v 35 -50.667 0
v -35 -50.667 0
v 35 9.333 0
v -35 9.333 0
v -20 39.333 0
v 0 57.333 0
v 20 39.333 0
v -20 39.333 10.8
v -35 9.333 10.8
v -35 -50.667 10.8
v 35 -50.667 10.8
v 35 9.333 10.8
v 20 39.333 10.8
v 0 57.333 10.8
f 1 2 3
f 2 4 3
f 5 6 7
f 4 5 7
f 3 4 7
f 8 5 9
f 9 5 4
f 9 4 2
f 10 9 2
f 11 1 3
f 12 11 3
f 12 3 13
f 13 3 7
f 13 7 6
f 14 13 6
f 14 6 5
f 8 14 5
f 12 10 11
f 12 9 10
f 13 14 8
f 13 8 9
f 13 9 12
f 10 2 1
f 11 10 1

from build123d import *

# Parameters (mm, degrees)
F0_W     = 70
F0_H     = 30
F1_DEPTH = 10.8


with BuildPart() as f1:
    # F0 (on Top) → F1 (new body)
    with BuildSketch(Plane.XY):
        with Locations((0, -35.666667)):
            Rectangle(F0_W, F0_H)
        Polygon((-20, 39.333333), (-35, 9.333333), (35, 9.333333), (20, 39.333333), align=None)
        with Locations((0, -5.666667)):
            Rectangle(F0_W, F0_H)
        Polygon((0, 57.333333), (-20, 39.333333), (20, 39.333333), align=None)
    extrude(amount=F1_DEPTH)


solid = f1.part
